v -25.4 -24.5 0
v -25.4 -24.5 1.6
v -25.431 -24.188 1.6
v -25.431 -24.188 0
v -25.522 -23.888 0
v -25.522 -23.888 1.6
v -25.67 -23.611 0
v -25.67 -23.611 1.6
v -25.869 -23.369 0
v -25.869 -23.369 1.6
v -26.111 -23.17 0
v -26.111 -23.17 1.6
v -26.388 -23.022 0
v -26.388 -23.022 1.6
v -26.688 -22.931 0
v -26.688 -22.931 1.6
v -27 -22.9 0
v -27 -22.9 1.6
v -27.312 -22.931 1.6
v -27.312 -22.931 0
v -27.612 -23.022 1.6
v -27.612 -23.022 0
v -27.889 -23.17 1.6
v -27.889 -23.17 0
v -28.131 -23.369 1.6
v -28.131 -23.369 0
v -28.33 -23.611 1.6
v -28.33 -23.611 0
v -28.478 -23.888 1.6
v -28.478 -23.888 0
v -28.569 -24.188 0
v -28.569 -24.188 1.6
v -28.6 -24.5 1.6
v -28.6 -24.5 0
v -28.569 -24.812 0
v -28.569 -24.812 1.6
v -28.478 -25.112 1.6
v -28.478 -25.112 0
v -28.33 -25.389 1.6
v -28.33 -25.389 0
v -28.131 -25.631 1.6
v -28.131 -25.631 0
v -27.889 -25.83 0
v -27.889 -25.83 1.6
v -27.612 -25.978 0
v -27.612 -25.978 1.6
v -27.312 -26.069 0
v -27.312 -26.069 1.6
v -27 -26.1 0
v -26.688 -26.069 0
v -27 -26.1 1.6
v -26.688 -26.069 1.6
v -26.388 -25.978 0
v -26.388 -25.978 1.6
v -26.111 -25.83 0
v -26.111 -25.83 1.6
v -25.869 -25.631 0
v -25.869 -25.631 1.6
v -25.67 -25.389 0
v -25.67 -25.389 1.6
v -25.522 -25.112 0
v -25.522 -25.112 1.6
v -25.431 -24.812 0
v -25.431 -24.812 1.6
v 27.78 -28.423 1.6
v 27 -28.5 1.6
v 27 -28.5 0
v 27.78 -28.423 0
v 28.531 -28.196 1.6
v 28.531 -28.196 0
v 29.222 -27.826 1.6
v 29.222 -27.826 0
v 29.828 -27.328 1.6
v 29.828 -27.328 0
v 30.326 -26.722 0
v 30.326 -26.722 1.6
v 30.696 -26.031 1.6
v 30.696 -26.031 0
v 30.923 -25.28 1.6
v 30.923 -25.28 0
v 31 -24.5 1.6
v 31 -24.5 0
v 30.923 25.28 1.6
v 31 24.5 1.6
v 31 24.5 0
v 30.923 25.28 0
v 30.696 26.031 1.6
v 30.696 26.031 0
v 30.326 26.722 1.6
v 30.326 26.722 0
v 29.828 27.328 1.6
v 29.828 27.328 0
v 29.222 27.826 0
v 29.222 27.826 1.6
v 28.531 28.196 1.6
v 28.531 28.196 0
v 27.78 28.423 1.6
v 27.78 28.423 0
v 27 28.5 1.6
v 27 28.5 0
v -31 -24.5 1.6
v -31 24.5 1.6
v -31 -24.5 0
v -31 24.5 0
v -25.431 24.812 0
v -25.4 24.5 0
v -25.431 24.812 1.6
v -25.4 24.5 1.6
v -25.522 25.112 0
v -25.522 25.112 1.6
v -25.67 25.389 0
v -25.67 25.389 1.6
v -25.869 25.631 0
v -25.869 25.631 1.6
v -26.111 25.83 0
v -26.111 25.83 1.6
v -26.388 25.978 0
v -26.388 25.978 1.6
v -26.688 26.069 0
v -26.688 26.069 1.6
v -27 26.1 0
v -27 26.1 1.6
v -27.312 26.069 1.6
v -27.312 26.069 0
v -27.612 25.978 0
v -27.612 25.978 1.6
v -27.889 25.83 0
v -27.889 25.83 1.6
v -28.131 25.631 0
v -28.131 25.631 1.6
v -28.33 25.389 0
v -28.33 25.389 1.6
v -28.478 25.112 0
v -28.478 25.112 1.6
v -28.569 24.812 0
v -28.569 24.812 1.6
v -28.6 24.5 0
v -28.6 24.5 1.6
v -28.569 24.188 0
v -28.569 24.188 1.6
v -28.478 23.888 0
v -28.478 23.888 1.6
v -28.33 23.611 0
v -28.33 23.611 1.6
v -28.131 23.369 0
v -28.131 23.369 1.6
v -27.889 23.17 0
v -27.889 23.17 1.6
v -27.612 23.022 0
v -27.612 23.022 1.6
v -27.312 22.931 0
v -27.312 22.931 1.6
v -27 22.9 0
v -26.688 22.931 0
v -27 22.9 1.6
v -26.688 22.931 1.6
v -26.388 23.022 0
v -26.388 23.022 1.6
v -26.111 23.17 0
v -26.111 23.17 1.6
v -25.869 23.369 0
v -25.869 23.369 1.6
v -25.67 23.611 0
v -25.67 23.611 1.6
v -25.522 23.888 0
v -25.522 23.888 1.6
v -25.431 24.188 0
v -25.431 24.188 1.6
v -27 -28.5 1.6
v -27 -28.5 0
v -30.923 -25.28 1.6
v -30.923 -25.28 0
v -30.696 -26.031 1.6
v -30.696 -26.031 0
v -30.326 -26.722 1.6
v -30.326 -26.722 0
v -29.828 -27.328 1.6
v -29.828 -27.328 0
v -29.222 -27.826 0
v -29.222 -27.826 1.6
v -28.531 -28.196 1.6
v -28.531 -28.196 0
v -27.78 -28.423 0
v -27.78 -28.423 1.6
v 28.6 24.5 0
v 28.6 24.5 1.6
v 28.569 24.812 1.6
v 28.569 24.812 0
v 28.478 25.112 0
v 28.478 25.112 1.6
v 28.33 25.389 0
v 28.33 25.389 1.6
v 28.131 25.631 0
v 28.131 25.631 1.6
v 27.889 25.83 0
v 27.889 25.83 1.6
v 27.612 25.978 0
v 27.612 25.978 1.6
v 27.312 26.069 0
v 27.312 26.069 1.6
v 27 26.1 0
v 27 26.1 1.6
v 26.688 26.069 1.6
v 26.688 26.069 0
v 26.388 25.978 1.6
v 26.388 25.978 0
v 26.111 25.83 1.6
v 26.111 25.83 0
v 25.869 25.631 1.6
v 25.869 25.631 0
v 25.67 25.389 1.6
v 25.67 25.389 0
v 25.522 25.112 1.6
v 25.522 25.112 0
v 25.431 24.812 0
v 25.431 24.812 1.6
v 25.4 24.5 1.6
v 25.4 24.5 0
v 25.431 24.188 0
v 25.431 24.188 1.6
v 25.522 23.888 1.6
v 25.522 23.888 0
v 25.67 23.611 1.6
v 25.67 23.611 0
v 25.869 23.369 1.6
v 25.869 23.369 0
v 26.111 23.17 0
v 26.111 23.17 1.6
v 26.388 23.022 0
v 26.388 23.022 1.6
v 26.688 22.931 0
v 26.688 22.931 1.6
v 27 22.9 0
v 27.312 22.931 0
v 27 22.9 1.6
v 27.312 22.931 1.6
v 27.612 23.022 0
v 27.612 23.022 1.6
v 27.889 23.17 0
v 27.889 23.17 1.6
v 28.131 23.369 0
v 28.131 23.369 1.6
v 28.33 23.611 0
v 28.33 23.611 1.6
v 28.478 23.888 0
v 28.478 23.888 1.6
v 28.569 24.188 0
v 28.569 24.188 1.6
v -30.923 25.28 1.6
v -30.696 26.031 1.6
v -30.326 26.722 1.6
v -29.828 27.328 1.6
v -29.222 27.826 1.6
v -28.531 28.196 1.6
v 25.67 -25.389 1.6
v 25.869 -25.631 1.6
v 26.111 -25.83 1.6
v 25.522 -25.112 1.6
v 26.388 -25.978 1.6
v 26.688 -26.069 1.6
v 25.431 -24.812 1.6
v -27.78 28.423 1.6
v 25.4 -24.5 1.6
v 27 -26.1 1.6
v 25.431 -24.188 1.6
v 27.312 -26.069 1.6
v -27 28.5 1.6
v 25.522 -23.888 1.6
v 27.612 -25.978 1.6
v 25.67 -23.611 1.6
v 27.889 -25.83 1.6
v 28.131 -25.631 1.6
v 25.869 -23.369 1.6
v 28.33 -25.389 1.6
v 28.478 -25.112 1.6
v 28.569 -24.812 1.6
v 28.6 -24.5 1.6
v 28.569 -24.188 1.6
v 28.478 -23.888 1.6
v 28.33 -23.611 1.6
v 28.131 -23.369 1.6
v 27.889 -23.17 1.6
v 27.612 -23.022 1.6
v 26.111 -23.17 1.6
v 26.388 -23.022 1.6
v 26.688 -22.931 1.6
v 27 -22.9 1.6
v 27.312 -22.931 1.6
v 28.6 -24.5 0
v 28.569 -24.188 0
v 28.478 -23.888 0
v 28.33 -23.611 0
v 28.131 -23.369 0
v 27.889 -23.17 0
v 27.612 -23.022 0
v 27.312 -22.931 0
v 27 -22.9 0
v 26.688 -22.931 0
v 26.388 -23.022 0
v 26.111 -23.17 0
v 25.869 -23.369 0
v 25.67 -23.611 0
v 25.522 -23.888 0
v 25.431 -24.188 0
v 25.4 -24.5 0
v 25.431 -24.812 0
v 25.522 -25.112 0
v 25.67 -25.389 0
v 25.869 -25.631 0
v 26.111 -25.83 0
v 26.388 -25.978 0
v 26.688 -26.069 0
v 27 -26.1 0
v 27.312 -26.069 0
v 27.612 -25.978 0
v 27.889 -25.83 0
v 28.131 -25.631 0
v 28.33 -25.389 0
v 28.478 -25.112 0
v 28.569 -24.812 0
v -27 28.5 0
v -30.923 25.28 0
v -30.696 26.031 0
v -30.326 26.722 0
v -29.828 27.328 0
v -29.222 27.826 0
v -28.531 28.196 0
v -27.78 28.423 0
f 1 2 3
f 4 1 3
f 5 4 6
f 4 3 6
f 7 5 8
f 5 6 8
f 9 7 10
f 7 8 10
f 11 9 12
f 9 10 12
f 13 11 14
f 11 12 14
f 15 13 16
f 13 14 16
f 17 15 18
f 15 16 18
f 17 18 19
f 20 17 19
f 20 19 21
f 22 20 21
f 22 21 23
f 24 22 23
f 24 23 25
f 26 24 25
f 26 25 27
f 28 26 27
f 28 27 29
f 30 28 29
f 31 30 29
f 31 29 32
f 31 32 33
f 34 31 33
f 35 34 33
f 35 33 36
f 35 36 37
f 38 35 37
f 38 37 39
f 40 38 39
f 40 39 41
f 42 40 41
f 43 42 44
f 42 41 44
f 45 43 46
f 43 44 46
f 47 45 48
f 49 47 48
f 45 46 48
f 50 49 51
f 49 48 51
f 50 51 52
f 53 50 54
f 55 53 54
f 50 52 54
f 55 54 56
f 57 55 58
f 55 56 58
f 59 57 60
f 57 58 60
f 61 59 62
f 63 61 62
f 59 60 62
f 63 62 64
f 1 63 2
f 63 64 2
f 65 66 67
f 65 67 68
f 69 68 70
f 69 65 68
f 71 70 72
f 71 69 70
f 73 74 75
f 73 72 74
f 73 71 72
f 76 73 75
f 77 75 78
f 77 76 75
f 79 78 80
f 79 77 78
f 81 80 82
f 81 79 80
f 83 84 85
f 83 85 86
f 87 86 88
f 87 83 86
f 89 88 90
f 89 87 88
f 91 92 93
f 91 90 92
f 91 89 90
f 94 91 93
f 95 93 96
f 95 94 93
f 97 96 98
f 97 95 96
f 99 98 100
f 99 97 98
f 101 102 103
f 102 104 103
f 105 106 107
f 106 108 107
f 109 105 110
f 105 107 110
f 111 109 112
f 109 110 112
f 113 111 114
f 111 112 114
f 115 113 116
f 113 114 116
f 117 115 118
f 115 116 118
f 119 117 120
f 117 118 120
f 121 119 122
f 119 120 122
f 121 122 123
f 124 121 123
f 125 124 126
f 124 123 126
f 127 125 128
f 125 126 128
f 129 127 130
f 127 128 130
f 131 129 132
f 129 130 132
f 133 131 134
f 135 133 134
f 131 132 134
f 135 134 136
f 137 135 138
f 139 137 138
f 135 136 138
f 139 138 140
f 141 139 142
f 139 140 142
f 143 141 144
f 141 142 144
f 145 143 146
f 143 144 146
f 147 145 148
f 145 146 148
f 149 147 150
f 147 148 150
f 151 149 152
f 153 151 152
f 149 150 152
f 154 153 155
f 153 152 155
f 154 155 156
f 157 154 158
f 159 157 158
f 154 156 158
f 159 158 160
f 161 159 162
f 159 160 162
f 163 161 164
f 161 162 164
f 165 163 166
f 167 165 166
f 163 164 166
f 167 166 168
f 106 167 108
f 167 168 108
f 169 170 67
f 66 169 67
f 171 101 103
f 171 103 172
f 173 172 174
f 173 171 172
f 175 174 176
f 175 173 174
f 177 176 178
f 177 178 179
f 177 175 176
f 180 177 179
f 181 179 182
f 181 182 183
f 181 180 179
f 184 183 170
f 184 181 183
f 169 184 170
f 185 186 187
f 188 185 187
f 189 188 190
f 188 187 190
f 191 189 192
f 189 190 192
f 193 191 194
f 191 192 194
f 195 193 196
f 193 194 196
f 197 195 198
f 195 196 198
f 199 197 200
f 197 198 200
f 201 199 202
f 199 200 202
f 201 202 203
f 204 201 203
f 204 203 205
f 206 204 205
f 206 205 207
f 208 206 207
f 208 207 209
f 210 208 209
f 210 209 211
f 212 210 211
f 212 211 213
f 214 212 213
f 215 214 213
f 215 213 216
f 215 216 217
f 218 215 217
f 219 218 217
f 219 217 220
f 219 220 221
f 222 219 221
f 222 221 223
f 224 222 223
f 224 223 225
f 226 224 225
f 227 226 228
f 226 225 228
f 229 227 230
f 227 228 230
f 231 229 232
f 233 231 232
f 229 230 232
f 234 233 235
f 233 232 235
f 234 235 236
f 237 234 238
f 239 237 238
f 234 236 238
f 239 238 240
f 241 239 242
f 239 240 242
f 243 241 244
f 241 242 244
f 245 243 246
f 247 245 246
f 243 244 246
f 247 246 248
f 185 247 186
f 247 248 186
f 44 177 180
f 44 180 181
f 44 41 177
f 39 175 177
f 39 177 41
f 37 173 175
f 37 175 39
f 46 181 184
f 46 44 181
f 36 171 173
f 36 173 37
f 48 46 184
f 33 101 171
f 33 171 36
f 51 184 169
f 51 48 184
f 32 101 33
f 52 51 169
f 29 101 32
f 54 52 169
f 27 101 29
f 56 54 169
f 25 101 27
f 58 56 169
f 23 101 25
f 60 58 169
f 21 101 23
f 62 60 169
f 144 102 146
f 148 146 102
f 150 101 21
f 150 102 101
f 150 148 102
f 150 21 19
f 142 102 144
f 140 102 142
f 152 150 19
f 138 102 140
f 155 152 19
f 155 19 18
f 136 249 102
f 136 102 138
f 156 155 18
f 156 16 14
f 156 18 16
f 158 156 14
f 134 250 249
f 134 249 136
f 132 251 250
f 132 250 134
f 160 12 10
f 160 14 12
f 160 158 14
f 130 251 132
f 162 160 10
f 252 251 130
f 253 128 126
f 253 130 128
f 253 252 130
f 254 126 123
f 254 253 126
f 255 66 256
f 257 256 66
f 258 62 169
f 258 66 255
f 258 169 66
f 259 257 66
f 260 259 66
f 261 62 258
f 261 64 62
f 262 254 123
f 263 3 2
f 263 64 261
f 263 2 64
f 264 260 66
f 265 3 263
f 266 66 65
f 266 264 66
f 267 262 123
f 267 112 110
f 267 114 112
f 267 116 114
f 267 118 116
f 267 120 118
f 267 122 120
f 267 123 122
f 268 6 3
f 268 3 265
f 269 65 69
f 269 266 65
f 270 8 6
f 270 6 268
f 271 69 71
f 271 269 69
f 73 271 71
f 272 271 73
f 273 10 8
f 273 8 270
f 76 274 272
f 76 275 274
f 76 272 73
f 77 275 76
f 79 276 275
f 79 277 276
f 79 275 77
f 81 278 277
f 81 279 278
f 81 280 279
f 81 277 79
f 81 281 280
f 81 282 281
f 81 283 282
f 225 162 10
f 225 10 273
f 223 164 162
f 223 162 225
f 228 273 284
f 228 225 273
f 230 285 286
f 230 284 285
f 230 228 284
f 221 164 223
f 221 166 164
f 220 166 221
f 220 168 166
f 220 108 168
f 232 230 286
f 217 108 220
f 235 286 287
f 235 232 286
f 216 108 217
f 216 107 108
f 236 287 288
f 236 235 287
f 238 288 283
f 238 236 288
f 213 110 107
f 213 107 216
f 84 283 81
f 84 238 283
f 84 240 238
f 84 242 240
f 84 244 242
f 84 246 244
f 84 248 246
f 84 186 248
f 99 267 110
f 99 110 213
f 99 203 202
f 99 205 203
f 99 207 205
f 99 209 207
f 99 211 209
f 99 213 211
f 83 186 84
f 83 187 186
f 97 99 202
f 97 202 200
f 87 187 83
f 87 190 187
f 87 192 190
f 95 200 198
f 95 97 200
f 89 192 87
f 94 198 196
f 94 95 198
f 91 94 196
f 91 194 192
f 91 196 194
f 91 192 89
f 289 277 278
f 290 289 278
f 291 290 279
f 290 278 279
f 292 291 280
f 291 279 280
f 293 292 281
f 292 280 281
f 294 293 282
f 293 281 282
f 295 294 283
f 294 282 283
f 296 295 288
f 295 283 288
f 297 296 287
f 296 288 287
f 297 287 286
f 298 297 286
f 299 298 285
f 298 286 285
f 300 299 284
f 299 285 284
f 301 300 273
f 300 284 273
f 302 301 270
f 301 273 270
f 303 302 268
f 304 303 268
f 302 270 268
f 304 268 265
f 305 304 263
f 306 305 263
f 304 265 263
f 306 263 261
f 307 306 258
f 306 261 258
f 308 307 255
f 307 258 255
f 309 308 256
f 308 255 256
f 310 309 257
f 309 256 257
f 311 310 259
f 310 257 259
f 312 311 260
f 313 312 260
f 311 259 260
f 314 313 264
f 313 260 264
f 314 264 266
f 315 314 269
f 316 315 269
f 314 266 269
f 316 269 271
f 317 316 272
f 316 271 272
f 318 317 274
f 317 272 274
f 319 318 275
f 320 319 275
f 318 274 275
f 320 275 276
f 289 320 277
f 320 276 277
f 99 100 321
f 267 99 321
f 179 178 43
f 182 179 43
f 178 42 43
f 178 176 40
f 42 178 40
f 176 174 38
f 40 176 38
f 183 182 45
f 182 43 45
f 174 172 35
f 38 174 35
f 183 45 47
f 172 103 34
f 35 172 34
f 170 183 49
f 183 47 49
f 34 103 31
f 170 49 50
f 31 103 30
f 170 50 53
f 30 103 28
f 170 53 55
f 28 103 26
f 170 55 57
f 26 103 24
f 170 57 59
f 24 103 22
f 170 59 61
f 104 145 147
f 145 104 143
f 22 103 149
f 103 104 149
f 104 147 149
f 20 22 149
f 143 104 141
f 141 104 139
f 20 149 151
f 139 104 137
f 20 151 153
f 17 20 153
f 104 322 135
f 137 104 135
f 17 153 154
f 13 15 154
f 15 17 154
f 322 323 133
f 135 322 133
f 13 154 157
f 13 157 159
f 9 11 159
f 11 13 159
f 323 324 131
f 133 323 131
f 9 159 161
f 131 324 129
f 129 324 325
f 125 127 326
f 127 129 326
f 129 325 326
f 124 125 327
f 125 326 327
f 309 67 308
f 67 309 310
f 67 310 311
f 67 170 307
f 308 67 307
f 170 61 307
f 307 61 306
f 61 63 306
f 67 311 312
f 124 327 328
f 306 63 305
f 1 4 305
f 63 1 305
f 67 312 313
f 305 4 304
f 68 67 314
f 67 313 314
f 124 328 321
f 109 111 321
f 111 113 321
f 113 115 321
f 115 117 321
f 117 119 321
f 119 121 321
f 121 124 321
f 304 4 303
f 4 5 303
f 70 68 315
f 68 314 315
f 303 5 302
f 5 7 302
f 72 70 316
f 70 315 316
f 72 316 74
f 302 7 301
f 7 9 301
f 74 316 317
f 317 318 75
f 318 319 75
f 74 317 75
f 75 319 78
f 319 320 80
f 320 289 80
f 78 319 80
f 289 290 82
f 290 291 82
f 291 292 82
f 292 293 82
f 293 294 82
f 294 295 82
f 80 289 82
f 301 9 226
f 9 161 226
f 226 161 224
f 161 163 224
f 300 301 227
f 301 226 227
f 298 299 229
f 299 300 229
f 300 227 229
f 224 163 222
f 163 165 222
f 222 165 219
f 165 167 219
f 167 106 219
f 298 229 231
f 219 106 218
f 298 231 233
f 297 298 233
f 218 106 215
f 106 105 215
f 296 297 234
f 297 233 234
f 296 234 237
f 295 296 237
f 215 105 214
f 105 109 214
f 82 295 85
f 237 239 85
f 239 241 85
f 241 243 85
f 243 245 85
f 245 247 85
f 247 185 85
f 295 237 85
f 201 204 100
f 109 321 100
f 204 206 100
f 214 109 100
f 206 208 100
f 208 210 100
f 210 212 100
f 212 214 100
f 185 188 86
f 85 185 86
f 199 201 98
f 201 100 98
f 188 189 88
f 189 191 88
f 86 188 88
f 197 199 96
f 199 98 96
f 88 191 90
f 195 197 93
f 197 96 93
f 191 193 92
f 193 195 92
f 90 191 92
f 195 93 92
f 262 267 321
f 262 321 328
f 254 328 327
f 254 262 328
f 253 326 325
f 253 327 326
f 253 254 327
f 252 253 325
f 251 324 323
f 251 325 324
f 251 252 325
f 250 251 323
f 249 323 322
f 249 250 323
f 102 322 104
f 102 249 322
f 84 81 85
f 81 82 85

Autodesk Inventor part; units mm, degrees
ref_plane "YZ Plane" through (0, 0, 0) normal (1, 0, 0) x (0, 1, 0)
ref_plane "XZ Plane" through (0, 0, 0) normal (0, 1, 0) x (-1, 0, 0)
ref_plane "XY Plane" through (0, 0, 0) normal (0, 0, 1) x (1, 0, 0)
sketch "Sketch1" plane through (0, 0, 0) normal (0, 0, 1) x (1, 0, 0)
  line L0 (-31, -28.5) -> (31, -28.5)
  line L1 (31, -28.5) -> (31, 28.5)
  line L2 (31, 28.5) -> (-31, 28.5)
  line L3 (-31, 28.5) -> (-31, -28.5)
  line L4 (-31, -28.5) -> (31, 28.5) construction
  line L5 (31, -28.5) -> (-31, 28.5) construction
  point P0 (0, 0)
  dimension "d0" = 62
  dimension "d1" = 57
extrude "Extrusion1" add sketch "Sketch1" along normal blind 1.6
fillet "Fillet1" radius 4 4 edges at (31, 28.5, 0.8) (-31, 28.5, 0.8) (-31, -28.5, 0.8) (31, -28.5, 0.8)
sketch "Sketch2" plane through (0, 0, 1.6) normal (0, 0, 1) x (1, 0, 0)
  circle A0 centre (-27, 24.5) radius 1.6
  line L0 (-43.4, 0) -> (43.4, 0) projected
  line L1 (0, -39.9) -> (0, 39.9) construction
  line L2 (-31, 24.5) -> (-31, -24.5) construction
  line L3 (27, 28.5) -> (-27, 28.5) construction
  circle A1 centre (27, 24.5) radius 1.6
  circle A2 centre (-27, -24.5) radius 1.6
  line L4 (27, -28.5) -> (-27, -28.5) construction
  circle A3 centre (27, -24.5) radius 1.6
  point P0 (0, 0)
  dimension "d5" = 4
  dimension "d6" = 4
  dimension "d7" = 3.2
extrude "Extrusion2" cut sketch "Sketch2" against normal through all
sketch "Sketch3" plane through (0, 0, 1.6) normal (0, 0, 1) x (1, 0, 0)
  circle A0 centre (-27, -24.5) radius 1.6 projected
  circle A1 centre (27, 24.5) radius 1.6 projected
  circle A2 centre (27, -24.5) radius 1.6 projected
  circle A3 centre (-27, 24.5) radius 1.6 projected
  arc A4 (27, -28.5) -> (31, -24.5) centre (27, -24.5) ccw projected
  line L0 (31, -24.5) -> (31, 24.5) projected
  arc A5 (31, 24.5) -> (27, 28.5) centre (27, 24.5) ccw projected
  line L1 (27, 28.5) -> (-27, 28.5) projected
  arc A6 (-27, 28.5) -> (-31, 24.5) centre (-27, 24.5) ccw projected
  line L2 (-31, 24.5) -> (-31, -24.5) projected
  arc A7 (-31, -24.5) -> (-27, -28.5) centre (-27, -24.5) ccw projected
  line L3 (-27, -28.5) -> (27, -28.5) projected
  point P0 (0, 0)
equation "\"d6\" = d5"
properties part number "Controller_PCB"
